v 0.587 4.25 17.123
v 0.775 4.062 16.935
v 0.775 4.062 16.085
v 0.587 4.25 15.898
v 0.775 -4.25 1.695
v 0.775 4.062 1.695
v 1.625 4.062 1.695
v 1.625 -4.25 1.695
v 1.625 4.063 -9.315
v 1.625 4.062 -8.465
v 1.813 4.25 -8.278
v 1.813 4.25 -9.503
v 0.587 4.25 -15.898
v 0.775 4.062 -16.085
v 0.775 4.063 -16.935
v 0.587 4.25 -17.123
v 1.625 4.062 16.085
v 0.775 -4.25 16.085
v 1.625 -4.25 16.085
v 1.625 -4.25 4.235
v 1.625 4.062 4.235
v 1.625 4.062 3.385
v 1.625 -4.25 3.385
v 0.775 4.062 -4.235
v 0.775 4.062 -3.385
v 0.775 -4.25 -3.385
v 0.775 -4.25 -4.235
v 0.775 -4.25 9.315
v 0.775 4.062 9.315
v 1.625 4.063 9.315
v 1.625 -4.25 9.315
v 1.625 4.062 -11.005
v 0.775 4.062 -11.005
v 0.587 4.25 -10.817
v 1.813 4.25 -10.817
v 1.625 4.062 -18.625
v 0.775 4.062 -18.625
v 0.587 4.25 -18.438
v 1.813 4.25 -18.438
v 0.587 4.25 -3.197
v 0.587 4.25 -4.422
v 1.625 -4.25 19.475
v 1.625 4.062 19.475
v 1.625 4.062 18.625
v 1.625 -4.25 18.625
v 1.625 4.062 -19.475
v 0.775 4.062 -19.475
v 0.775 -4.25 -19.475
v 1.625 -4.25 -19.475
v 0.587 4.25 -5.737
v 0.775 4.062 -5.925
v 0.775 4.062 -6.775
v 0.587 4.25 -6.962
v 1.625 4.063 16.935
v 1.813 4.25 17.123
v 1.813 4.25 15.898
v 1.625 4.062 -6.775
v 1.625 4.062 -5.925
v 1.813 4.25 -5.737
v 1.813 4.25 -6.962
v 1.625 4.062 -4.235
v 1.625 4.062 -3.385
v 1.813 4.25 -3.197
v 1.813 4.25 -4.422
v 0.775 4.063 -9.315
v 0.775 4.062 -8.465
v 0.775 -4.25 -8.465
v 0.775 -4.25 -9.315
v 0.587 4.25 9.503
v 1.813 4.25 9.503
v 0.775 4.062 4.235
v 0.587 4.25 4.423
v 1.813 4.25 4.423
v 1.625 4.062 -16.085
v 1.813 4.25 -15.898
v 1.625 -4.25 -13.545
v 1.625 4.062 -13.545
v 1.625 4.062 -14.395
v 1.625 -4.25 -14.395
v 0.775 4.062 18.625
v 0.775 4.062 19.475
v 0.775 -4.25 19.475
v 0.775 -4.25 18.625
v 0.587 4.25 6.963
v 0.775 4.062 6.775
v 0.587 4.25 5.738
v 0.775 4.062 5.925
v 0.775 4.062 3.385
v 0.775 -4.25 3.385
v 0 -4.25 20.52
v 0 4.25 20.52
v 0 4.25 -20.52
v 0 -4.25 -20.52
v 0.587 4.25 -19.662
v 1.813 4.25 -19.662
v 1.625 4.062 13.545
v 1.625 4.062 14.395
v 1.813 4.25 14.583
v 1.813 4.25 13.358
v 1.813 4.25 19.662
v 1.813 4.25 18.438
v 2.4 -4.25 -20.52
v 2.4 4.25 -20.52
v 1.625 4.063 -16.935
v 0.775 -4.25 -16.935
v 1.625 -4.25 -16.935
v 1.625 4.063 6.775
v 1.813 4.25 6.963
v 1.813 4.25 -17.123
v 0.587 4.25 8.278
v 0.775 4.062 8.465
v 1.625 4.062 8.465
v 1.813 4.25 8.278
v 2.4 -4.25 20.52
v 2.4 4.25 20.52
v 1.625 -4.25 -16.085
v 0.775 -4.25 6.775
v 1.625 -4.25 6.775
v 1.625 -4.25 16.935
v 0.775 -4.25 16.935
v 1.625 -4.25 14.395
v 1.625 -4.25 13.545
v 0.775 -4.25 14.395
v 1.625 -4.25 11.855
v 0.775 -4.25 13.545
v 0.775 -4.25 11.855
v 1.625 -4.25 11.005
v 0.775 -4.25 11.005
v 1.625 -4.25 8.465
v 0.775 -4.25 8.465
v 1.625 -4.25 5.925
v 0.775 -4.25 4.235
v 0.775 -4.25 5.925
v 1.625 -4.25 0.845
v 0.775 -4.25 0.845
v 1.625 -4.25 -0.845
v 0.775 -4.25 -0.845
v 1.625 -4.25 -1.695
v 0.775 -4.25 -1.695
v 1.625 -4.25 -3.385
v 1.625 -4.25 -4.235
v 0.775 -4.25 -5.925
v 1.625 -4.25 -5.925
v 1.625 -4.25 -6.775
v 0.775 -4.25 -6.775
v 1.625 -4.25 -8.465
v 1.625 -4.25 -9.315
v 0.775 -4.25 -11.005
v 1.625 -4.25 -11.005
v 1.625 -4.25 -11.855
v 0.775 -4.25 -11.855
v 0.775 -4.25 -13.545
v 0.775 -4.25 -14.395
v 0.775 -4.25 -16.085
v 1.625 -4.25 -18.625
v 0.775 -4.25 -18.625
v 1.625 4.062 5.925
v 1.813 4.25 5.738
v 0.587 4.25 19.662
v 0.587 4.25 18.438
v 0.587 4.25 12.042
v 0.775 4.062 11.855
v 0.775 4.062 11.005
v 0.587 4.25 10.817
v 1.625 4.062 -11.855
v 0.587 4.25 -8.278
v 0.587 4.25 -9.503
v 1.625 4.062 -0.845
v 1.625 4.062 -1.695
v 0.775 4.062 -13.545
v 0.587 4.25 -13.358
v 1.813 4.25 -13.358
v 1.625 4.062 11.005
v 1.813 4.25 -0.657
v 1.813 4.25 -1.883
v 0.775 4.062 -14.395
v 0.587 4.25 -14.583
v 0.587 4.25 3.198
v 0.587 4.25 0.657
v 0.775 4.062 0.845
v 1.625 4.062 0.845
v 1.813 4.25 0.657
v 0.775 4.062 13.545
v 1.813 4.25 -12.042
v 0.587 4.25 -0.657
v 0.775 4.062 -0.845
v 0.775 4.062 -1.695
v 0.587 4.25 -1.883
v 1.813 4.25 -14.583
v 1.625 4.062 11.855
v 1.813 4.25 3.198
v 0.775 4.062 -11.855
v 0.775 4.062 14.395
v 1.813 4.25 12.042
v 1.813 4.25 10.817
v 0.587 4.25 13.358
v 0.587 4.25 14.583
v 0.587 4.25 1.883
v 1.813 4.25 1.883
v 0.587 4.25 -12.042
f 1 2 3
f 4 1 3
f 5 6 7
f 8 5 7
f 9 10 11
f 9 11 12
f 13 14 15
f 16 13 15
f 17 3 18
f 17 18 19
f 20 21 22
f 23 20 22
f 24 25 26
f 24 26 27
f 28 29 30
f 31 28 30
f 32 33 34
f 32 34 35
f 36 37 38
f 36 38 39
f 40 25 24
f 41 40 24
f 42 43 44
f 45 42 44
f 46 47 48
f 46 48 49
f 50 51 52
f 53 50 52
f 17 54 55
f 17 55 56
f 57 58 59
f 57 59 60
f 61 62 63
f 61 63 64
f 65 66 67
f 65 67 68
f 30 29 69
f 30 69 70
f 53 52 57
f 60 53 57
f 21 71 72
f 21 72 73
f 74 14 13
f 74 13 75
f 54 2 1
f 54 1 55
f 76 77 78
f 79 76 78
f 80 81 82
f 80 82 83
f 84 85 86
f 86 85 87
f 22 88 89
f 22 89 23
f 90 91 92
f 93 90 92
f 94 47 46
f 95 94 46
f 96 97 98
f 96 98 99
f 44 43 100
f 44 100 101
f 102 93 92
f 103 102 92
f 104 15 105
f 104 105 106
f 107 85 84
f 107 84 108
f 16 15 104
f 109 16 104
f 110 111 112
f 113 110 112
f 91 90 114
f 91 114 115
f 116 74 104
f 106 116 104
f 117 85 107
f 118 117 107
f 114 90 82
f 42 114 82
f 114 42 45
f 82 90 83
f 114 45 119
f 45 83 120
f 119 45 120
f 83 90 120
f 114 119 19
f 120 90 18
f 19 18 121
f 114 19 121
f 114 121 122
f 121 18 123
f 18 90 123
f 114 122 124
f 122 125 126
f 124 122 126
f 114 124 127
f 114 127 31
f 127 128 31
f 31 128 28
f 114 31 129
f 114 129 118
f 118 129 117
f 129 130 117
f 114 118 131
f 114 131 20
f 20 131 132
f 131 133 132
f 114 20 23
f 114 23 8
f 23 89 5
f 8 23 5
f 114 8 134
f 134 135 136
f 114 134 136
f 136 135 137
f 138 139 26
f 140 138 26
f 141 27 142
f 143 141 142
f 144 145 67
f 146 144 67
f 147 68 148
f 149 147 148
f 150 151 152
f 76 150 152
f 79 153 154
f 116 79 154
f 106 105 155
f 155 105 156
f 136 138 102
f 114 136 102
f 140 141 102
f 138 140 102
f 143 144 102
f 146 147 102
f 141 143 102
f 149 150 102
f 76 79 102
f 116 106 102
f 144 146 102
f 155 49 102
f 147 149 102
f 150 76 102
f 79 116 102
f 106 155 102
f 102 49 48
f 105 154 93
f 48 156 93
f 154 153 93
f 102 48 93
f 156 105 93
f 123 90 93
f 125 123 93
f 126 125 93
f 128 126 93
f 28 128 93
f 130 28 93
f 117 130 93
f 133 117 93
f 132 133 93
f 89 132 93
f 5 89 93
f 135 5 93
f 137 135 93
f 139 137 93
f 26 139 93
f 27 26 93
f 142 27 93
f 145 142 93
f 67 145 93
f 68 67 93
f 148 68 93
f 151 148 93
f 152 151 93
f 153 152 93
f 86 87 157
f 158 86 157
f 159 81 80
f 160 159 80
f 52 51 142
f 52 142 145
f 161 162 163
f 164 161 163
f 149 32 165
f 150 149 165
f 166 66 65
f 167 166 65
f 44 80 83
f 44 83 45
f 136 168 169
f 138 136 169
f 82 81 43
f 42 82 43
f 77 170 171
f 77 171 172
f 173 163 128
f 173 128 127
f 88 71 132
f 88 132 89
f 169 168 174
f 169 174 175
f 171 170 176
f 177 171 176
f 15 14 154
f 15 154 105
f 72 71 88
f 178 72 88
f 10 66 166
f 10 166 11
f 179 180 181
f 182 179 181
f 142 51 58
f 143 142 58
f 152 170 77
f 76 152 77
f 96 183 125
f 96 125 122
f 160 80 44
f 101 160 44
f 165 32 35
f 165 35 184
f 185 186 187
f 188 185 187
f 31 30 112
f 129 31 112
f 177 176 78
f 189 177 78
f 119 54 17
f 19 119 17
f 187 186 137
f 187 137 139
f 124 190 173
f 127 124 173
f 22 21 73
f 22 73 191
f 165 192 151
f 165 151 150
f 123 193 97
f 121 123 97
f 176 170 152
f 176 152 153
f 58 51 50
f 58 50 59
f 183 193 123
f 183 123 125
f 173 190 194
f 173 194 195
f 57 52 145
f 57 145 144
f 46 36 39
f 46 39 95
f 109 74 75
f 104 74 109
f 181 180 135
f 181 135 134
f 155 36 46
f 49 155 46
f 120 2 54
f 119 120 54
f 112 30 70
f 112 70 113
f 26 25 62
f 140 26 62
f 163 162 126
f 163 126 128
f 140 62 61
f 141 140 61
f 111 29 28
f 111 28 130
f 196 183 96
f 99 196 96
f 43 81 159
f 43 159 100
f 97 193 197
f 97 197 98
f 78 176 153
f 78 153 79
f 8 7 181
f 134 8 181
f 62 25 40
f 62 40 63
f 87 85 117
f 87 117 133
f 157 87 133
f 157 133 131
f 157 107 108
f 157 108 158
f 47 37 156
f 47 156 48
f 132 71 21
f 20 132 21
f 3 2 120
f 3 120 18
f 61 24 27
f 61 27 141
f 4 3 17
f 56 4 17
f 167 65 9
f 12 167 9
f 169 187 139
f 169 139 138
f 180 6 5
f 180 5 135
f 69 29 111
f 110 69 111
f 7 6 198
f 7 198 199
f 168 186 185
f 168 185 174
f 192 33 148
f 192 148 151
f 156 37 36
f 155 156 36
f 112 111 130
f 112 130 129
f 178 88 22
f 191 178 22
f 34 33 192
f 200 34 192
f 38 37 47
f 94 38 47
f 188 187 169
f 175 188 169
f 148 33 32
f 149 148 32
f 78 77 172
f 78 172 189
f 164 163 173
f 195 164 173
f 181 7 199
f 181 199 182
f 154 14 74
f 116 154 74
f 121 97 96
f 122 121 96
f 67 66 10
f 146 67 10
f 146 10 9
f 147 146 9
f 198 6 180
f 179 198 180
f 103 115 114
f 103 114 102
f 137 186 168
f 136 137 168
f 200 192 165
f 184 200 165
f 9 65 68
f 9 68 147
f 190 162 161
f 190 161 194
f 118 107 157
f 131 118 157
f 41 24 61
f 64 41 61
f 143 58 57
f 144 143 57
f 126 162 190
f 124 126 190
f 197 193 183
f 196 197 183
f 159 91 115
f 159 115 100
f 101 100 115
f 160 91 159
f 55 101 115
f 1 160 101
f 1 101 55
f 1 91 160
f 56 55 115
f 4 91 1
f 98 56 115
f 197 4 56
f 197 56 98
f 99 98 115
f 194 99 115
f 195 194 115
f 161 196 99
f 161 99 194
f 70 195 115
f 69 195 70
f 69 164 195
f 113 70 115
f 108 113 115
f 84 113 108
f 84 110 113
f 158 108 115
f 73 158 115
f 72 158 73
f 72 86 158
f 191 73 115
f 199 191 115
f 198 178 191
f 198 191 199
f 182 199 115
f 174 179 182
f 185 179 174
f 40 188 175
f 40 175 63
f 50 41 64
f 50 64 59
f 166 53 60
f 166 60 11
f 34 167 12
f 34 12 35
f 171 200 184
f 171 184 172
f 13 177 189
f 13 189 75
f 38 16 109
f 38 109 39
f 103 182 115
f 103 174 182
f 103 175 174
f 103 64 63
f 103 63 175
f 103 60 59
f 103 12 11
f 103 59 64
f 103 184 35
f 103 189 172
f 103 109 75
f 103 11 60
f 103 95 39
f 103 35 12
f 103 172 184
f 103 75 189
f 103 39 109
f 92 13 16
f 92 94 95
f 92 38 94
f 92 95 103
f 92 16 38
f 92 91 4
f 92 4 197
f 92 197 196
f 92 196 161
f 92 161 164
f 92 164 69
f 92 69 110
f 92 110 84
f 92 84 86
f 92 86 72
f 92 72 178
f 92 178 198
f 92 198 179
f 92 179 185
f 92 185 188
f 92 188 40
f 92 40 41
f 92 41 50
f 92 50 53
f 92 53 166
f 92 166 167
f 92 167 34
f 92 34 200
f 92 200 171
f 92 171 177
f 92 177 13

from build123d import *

# Parameters (mm, degrees)
SKETCH1_W                  = 41.04
SKETCH1_H                  = 8.5
BOSS_EXTRUDE1_DEPTH        = 2.4
SKETCH3_W                  = 0.85
SKETCH3_H                  = 0.85
CUT_EXTRUDE2_DEPTH         = 23.34010743
CHAMFER1_SIZE              = 0.1875
LPATTERN2_COUNT            = 16
LPATTERN2_PITCH            = 2.54
CHAMFER1_OF_LPATTERN2_SIZE = 0.1875


with BuildPart() as part:
    # Sketch1 → Boss-Extrude1 (new body)
    with BuildSketch(Plane(origin=(0, 0, 0), x_dir=(0, 0, -1), z_dir=(1, 0, 0))):
        Rectangle(SKETCH1_W, SKETCH1_H)
    extrude(amount=BOSS_EXTRUDE1_DEPTH)

    # Sketch3 → Cut-Extrude2 (cut, through all)
    with BuildSketch(Plane(origin=(0, 4.25, 0), x_dir=(1, 0, 0), z_dir=(0, 1, 0))):
        with Locations((1.2, -19.05)):
            Rectangle(SKETCH3_W, SKETCH3_H)
    cut_extrude2 = extrude(amount=-CUT_EXTRUDE2_DEPTH, mode=Mode.SUBTRACT)

    # Chamfer1
    chamfer1_edges = [part.edges().sort_by_distance(p)[0] for p in [
        (1.2, 4.25, 18.625),
        (0.775, 4.25, 19.05),
        (1.2, 4.25, 19.475),
        (1.625, 4.25, 19.05),
    ]]
    chamfer(chamfer1_edges, length=CHAMFER1_SIZE)

    # LPattern2: Cut-Extrude2 ×16
    with Locations(*[(0, 0, -i * LPATTERN2_PITCH) for i in range(1, LPATTERN2_COUNT)]):
        add(cut_extrude2, mode=Mode.SUBTRACT)

    # Chamfer1 of LPattern2
    chamfer1_of_lpattern2_edges = [part.edges().sort_by_distance(p)[0] for p in [
        (1.2, 4.25, 16.085),
        (0.775, 4.25, 16.51),
        (1.2, 4.25, 16.935),
        (1.625, 4.25, 16.51),
        (1.2, 4.25, 13.545),
        (0.775, 4.25, 13.97),
        (1.2, 4.25, 14.395),
        (1.625, 4.25, 13.97),
        (1.2, 4.25, 11.005),
        (0.775, 4.25, 11.43),
        (1.2, 4.25, 11.855),
        (1.625, 4.25, 11.43),
        (1.2, 4.25, 8.465),
        (0.775, 4.25, 8.89),
        (1.2, 4.25, 9.315),
        (1.625, 4.25, 8.89),
        (1.2, 4.25, 5.925),
        (0.775, 4.25, 6.35),
        (1.2, 4.25, 6.775),
        (1.625, 4.25, 6.35),
        (1.2, 4.25, 3.385),
        (0.775, 4.25, 3.81),
        (1.2, 4.25, 4.235),
        (1.625, 4.25, 3.81),
        (1.2, 4.25, 0.845),
        (0.775, 4.25, 1.27),
        (1.2, 4.25, 1.695),
        (1.625, 4.25, 1.27),
        (1.2, 4.25, -1.695),
        (0.775, 4.25, -1.27),
        (1.2, 4.25, -0.845),
        (1.625, 4.25, -1.27),
        (1.2, 4.25, -4.235),
        (0.775, 4.25, -3.81),
        (1.2, 4.25, -3.385),
        (1.625, 4.25, -3.81),
        (1.2, 4.25, -6.775),
        (0.775, 4.25, -6.35),
        (1.2, 4.25, -5.925),
        (1.625, 4.25, -6.35),
        (1.2, 4.25, -9.315),
        (0.775, 4.25, -8.89),
        (1.2, 4.25, -8.465),
        (1.625, 4.25, -8.89),
        (1.2, 4.25, -11.855),
        (0.775, 4.25, -11.43),
        (1.2, 4.25, -11.005),
        (1.625, 4.25, -11.43),
        (1.2, 4.25, -14.395),
        (0.775, 4.25, -13.97),
        (1.2, 4.25, -13.545),
        (1.625, 4.25, -13.97),
        (1.2, 4.25, -16.935),
        (0.775, 4.25, -16.51),
        (1.2, 4.25, -16.085),
        (1.625, 4.25, -16.51),
        (1.2, 4.25, -19.475),
        (0.775, 4.25, -19.05),
        (1.2, 4.25, -18.625),
        (1.625, 4.25, -19.05),
    ]]
    chamfer(chamfer1_of_lpattern2_edges, length=CHAMFER1_OF_LPATTERN2_SIZE)


solid = part.part
